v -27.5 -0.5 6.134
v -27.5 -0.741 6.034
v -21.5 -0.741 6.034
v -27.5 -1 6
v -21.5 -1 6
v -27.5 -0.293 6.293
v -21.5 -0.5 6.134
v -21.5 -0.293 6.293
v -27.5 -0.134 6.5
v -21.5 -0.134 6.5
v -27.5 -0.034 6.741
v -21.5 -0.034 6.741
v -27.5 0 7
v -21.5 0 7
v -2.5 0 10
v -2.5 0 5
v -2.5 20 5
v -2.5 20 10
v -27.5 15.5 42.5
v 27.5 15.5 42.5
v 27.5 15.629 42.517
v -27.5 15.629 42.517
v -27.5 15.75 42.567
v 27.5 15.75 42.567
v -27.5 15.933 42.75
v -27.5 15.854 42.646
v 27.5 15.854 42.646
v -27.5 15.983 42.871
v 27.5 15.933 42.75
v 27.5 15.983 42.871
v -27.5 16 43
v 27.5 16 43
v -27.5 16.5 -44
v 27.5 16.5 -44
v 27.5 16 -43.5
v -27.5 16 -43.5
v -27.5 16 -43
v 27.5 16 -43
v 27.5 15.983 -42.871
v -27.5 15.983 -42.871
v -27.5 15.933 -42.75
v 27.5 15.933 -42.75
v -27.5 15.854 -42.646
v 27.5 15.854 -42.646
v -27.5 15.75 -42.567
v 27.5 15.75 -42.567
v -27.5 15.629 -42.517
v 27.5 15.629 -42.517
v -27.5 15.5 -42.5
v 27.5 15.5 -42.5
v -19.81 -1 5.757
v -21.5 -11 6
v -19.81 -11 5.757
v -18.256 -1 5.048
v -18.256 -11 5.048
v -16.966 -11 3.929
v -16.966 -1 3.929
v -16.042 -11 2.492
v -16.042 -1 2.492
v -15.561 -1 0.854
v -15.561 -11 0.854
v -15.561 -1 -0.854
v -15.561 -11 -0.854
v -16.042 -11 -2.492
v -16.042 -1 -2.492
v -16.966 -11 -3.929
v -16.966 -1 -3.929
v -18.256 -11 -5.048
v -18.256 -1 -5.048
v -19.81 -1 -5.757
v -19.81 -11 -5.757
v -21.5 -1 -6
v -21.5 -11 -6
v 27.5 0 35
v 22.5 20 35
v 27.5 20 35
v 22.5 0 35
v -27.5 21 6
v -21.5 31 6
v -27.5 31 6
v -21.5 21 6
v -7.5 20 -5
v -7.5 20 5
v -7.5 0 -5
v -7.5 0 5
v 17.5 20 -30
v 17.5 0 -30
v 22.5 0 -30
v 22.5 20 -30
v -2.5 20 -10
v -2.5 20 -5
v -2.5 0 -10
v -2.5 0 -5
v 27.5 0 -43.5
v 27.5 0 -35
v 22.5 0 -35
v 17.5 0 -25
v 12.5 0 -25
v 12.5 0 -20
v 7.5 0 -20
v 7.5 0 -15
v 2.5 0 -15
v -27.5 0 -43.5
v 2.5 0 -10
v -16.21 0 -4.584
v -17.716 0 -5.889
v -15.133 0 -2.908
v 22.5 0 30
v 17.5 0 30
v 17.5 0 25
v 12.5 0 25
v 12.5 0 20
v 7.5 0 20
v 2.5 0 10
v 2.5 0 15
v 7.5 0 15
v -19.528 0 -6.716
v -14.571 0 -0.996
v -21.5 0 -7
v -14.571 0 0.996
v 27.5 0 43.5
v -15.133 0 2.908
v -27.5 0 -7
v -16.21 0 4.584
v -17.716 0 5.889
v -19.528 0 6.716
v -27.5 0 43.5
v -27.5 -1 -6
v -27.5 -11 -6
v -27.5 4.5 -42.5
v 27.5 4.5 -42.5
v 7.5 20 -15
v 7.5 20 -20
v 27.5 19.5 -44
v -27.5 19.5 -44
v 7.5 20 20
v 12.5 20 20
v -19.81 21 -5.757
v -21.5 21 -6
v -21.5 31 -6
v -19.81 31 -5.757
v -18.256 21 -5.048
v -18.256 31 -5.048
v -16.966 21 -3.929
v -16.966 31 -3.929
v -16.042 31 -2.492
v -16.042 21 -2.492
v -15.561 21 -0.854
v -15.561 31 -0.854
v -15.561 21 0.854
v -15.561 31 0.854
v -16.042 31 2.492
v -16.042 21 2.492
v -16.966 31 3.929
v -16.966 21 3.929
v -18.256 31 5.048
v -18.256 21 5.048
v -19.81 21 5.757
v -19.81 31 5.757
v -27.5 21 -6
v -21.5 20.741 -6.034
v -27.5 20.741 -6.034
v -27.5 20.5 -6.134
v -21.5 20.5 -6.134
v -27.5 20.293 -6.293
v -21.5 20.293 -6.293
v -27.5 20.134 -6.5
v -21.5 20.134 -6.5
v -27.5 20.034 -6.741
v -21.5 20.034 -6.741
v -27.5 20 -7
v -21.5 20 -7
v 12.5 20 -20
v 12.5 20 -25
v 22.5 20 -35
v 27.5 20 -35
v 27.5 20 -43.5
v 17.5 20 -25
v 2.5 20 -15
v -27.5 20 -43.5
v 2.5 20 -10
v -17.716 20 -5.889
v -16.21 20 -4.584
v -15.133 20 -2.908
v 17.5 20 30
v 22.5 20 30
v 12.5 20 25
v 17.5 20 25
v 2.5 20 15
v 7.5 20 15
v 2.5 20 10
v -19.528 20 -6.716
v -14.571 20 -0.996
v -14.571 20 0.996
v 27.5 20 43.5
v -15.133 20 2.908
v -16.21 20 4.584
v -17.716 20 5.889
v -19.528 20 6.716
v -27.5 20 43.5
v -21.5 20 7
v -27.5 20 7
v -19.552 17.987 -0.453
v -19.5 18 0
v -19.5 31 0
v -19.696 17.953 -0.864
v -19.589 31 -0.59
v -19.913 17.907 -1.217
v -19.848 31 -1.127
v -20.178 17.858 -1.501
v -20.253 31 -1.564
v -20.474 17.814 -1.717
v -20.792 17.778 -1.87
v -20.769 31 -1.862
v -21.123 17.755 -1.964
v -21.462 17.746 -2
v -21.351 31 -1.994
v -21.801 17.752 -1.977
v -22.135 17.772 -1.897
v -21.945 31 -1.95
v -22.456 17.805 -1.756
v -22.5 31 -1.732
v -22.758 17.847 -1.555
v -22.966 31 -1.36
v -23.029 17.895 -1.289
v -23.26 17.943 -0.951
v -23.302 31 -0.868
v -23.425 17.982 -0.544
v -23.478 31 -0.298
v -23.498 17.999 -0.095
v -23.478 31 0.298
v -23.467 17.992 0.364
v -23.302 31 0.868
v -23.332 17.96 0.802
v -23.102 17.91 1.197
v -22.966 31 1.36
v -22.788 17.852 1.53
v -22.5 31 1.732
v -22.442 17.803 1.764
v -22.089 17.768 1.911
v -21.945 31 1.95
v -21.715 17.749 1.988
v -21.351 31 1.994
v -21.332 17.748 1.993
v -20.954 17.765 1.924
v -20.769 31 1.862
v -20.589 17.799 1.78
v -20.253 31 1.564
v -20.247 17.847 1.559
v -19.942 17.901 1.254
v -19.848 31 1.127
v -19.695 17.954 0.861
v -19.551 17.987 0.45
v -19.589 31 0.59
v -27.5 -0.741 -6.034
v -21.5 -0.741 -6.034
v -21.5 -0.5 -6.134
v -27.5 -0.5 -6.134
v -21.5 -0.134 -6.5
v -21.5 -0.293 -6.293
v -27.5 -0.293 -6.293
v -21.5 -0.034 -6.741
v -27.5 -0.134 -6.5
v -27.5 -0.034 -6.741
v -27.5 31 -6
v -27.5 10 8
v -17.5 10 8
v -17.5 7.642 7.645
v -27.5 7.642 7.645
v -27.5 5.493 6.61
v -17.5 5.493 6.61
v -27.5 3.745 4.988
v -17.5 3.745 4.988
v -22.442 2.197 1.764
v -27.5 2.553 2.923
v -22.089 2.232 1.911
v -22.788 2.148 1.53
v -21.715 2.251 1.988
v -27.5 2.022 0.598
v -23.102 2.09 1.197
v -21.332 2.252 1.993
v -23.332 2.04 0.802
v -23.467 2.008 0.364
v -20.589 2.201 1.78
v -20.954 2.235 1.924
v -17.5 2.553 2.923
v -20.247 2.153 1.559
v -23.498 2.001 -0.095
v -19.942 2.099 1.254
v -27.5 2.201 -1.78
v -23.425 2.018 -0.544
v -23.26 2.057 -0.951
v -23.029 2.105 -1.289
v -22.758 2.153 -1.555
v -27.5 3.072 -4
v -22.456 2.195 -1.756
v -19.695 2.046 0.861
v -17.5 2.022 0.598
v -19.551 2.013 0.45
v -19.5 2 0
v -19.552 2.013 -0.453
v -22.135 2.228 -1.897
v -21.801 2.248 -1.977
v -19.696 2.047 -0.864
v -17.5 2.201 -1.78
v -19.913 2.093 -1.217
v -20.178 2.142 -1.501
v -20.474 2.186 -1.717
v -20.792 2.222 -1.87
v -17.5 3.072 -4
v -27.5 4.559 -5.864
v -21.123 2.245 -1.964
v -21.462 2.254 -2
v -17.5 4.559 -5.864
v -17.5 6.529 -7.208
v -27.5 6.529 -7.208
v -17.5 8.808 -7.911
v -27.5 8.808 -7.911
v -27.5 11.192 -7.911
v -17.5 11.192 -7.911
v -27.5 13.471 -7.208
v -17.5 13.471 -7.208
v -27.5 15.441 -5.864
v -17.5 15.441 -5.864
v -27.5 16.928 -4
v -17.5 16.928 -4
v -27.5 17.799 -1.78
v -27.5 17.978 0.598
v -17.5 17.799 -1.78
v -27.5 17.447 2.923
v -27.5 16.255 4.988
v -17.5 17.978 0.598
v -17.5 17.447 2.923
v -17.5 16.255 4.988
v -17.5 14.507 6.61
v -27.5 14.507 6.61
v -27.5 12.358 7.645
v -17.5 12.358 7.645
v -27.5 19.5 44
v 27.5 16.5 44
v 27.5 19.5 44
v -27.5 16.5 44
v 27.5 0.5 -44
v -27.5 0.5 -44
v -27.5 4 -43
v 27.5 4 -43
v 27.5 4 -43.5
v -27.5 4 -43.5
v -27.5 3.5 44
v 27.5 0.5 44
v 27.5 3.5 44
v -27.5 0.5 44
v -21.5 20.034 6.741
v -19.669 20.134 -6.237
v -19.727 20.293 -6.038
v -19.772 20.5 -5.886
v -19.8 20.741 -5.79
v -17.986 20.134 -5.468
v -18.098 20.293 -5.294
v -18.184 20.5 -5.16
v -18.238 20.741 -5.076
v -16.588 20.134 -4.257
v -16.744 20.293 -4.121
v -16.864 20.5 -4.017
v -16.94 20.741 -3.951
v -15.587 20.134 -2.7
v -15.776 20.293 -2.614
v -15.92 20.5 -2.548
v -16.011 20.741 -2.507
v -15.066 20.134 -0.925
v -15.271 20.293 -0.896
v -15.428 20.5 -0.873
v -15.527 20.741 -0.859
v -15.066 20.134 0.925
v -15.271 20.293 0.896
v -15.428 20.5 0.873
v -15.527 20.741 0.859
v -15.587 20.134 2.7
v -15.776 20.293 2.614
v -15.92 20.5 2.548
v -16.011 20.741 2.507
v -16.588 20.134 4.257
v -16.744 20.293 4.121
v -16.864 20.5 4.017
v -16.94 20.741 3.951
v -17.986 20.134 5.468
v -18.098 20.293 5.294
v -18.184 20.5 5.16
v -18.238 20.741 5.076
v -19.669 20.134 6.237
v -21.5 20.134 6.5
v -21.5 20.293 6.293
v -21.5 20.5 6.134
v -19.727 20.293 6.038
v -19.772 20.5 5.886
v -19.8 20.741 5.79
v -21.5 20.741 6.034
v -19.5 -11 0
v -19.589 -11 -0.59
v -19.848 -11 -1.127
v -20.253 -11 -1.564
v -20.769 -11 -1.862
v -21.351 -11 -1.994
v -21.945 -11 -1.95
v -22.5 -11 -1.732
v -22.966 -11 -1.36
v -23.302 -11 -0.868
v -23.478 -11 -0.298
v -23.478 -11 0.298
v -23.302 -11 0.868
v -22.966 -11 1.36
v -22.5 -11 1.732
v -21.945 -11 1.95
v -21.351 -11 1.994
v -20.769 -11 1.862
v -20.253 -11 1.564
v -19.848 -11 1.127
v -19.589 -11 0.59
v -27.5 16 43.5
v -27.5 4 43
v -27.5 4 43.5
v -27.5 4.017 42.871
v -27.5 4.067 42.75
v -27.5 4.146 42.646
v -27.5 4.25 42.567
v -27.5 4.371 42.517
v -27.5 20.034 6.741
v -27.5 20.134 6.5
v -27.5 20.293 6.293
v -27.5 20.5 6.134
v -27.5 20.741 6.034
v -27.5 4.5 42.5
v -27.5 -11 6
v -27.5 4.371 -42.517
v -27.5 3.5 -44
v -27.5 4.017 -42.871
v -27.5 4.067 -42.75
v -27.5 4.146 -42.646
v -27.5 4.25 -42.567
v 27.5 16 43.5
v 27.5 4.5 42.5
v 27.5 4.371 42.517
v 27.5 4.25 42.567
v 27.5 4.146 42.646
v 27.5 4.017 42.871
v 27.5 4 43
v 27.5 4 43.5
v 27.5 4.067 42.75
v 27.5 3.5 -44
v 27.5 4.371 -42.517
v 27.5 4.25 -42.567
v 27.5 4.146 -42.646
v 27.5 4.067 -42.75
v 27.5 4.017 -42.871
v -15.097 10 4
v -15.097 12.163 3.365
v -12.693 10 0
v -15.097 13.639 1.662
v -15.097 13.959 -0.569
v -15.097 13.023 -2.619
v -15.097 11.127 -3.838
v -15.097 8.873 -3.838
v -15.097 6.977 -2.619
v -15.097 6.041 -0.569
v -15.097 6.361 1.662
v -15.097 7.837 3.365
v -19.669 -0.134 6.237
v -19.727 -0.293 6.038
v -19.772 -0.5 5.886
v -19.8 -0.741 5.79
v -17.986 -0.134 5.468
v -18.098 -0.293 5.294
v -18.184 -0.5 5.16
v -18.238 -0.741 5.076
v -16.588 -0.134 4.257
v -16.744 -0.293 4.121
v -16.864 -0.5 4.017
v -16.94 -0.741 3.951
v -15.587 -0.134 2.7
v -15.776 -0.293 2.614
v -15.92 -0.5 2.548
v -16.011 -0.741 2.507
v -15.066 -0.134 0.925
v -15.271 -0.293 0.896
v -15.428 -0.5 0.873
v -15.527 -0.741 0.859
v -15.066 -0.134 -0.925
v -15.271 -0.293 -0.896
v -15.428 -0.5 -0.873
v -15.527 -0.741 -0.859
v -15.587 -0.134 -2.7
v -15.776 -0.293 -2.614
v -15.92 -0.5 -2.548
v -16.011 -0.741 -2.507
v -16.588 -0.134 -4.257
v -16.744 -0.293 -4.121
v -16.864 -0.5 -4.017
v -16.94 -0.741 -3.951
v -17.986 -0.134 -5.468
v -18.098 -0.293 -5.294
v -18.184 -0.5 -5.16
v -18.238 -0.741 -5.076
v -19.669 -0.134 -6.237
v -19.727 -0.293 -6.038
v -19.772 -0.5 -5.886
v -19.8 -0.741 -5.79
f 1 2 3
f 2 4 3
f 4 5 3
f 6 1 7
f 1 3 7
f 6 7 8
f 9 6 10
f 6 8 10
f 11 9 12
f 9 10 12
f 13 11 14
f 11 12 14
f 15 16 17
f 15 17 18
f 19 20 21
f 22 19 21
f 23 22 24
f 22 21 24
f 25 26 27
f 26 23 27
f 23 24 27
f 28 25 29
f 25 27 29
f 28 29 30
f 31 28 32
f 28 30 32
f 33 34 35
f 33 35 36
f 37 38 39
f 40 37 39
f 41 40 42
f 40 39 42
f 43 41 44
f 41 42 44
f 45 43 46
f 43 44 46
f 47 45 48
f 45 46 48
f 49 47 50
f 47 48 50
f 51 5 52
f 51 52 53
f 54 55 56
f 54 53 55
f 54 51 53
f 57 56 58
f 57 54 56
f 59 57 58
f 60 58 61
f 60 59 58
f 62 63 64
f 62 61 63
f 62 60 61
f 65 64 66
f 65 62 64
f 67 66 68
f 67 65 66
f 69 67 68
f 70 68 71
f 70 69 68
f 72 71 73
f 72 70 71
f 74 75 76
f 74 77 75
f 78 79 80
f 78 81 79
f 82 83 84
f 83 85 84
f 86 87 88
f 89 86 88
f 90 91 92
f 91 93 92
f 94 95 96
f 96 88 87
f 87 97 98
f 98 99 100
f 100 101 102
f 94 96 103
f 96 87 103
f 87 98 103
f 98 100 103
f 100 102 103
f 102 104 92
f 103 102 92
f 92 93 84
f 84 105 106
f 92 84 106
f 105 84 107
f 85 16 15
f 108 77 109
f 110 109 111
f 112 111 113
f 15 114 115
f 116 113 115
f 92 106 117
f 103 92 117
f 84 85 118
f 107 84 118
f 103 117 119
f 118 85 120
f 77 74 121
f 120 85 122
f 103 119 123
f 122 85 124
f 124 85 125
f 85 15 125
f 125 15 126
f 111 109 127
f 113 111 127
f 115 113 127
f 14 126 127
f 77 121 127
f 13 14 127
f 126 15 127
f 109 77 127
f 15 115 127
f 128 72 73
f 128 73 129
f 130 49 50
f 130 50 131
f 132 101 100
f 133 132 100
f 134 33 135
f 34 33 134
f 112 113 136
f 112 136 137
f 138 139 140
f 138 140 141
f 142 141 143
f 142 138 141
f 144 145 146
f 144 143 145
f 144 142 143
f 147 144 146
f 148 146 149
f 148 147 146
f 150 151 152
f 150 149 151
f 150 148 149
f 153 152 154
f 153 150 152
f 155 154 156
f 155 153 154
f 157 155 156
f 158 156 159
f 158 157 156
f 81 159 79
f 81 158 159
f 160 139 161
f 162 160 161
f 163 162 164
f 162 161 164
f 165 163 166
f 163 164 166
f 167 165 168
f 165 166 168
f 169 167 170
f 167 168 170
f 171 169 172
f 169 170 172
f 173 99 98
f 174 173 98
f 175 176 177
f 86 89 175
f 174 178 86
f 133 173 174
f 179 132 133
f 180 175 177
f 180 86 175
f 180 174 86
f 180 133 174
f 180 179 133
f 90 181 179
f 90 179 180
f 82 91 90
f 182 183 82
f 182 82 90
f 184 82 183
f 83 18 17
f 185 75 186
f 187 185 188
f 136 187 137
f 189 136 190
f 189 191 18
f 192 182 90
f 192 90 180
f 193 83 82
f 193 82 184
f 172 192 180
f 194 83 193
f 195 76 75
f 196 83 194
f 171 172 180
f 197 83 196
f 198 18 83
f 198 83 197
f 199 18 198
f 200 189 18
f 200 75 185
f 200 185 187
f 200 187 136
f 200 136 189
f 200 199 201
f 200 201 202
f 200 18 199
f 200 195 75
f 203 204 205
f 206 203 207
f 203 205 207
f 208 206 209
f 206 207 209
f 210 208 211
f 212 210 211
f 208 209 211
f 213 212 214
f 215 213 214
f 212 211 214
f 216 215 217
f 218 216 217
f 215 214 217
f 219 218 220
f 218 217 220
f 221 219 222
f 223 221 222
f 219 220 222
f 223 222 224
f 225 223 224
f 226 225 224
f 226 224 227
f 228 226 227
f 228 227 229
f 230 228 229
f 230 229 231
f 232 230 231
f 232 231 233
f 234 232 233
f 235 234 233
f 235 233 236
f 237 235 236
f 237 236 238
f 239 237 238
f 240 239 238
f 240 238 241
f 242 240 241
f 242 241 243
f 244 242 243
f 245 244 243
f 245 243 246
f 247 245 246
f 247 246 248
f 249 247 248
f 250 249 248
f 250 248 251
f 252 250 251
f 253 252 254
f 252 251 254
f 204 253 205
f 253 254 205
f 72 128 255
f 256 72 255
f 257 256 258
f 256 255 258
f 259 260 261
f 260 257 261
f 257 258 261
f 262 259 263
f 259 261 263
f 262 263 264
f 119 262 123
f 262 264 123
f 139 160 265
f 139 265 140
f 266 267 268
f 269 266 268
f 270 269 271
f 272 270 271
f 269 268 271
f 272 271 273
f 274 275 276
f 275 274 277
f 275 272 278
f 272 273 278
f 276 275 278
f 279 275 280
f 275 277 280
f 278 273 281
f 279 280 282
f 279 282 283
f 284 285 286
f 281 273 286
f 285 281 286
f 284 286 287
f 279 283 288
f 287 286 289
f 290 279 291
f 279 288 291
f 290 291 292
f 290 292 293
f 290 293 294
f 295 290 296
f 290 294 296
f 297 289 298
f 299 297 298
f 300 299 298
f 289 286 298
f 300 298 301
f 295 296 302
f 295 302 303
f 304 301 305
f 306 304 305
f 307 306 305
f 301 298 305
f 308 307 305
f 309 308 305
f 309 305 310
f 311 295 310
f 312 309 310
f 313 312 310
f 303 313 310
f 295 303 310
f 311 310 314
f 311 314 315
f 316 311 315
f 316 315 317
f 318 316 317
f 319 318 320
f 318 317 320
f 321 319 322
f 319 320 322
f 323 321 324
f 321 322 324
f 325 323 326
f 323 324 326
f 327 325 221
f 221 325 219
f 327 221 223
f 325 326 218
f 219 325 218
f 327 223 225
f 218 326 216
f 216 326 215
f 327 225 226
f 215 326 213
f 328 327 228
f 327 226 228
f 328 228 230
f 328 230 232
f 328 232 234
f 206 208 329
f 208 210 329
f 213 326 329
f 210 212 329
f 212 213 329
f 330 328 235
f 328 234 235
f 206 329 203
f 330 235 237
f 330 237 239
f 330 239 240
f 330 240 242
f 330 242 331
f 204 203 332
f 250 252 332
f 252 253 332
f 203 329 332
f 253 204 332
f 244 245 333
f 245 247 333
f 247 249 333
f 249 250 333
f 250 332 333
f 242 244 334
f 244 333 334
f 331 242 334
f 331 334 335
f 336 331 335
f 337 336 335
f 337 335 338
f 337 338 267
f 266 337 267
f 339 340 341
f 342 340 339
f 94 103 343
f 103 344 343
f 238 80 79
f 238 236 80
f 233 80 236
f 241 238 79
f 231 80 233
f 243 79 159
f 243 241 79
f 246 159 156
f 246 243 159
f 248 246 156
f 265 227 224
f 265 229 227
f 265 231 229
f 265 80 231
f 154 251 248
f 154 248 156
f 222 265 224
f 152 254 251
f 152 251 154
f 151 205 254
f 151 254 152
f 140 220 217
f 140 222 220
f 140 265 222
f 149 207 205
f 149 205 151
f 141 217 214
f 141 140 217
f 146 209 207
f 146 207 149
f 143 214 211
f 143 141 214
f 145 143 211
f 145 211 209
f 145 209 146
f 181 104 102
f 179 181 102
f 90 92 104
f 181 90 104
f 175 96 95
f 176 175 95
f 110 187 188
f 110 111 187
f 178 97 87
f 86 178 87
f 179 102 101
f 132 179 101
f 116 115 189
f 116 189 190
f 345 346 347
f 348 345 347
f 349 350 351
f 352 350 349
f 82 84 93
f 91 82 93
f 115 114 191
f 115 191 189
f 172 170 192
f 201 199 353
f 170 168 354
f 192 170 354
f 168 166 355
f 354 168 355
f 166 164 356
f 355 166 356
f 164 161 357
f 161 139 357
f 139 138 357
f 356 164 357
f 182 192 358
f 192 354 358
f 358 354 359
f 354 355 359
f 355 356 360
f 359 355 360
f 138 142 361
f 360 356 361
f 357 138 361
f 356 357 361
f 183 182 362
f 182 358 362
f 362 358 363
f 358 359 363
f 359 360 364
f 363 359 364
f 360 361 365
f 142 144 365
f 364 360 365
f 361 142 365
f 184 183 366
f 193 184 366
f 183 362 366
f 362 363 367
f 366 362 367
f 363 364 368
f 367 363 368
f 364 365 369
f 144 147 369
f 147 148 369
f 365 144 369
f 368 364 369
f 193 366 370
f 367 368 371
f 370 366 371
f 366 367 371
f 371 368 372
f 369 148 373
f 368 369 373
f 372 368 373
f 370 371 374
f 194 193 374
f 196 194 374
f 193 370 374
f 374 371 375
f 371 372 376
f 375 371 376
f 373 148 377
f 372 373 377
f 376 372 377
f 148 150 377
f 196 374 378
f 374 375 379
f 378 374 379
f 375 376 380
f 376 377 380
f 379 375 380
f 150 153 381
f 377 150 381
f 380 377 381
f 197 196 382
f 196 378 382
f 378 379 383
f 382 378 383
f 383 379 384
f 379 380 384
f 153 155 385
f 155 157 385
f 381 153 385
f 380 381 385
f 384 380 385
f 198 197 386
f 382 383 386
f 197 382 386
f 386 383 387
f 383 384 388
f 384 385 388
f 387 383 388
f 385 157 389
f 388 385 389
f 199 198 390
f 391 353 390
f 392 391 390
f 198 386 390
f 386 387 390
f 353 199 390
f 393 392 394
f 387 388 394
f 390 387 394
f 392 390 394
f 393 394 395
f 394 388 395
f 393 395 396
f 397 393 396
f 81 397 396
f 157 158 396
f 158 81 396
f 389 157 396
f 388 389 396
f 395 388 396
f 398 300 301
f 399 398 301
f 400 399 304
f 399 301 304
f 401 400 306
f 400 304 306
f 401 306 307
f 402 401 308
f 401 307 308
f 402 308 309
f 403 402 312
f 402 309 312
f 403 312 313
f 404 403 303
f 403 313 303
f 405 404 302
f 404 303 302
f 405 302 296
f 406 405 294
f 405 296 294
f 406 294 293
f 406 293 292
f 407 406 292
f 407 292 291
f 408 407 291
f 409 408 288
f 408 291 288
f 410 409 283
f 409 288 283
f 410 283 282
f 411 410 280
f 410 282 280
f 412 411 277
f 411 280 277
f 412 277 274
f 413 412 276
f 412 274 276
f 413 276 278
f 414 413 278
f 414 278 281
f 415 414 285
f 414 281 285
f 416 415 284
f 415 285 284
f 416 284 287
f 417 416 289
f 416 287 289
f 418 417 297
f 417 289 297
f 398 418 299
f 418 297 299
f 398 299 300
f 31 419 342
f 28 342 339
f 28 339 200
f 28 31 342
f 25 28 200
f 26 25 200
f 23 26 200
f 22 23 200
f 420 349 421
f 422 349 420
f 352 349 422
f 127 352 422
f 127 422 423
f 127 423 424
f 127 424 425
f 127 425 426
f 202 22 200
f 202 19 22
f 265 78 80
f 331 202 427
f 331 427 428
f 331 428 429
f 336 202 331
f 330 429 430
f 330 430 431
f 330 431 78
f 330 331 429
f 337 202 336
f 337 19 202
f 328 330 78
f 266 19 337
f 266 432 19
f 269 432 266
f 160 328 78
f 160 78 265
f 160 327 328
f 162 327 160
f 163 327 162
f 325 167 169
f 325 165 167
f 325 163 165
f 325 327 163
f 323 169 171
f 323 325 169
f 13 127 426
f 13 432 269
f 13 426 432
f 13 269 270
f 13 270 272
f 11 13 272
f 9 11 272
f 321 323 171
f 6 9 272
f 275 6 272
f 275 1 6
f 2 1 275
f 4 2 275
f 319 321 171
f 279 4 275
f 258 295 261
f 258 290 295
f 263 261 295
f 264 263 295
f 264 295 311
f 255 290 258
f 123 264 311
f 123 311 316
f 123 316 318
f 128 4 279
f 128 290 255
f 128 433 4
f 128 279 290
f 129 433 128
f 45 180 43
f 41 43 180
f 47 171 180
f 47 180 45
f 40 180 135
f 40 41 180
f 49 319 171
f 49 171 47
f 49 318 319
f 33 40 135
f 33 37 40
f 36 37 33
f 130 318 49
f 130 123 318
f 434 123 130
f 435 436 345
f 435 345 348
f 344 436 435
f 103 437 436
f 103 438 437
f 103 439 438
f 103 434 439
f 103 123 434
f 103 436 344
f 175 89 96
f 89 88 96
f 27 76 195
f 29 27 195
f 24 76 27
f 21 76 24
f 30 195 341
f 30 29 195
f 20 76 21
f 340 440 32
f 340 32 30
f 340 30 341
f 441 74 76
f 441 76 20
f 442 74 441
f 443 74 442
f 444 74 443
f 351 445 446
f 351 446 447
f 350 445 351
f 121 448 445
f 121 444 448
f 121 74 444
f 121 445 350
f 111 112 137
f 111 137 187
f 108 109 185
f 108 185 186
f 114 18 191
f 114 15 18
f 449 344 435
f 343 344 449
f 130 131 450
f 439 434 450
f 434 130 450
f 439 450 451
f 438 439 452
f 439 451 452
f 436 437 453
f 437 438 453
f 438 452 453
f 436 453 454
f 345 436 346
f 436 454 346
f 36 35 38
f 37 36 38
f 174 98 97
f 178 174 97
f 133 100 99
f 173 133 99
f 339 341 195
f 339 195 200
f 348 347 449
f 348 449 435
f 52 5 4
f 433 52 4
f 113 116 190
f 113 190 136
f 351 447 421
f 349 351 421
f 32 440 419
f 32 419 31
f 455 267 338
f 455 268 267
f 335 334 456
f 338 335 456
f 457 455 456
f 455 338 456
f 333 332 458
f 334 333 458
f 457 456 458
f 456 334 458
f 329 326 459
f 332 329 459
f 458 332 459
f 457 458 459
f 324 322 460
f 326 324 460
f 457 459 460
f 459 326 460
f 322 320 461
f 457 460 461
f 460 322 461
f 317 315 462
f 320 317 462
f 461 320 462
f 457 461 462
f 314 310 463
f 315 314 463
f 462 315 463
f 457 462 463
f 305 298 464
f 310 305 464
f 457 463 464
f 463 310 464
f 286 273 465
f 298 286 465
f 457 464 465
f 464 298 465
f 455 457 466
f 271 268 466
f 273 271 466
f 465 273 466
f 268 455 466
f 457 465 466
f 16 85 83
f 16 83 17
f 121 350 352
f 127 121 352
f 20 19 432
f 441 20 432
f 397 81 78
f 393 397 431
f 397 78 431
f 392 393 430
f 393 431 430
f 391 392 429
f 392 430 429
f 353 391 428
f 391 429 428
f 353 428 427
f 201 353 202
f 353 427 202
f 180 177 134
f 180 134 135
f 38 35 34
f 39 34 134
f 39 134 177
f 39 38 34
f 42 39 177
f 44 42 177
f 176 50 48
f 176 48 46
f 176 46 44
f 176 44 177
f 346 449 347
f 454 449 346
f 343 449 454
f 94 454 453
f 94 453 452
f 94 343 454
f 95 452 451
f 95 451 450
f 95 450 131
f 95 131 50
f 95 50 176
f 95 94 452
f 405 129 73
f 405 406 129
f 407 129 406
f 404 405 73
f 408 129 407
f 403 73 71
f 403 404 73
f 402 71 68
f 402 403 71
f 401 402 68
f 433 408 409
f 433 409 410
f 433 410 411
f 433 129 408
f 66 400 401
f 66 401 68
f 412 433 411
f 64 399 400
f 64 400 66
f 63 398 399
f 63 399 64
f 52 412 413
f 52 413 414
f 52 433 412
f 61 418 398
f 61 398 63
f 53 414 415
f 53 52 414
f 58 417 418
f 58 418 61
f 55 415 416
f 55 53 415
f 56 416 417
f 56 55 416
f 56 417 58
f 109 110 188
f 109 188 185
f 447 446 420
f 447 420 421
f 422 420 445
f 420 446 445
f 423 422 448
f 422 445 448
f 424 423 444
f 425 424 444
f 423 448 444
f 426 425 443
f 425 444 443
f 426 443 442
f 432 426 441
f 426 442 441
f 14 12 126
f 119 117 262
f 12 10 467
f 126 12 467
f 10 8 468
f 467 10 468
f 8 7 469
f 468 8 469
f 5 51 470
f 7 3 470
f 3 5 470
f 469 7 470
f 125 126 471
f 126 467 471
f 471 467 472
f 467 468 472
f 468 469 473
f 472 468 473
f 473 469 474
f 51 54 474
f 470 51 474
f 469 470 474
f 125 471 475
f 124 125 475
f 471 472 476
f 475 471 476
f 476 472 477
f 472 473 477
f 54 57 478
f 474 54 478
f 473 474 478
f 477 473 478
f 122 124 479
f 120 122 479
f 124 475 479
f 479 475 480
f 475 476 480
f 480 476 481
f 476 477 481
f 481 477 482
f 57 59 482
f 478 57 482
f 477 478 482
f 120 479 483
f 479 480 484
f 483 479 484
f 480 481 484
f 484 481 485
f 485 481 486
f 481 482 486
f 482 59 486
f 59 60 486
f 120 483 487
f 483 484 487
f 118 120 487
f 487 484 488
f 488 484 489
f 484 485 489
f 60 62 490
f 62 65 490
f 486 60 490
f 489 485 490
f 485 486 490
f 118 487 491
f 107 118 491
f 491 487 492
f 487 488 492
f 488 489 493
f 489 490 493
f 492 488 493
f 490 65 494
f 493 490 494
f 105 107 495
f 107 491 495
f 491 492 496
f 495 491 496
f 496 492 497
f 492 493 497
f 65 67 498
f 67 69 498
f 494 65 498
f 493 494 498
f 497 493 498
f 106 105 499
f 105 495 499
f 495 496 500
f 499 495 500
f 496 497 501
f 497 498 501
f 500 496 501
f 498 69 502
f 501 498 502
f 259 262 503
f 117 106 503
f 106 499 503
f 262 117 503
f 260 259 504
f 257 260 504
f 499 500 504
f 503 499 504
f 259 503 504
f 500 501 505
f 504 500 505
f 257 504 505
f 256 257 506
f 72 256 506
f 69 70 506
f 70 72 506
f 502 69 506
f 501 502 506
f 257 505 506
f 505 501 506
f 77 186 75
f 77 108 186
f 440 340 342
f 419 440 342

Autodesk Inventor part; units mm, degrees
ref_plane "YZ Plane" through (0, 0, 0) normal (1, 0, 0) x (0, 1, 0)
ref_plane "XZ Plane" through (0, 0, 0) normal (0, 1, 0) x (-1, 0, 0)
ref_plane "XY Plane" through (0, 0, 0) normal (0, 0, 1) x (1, 0, 0)
sketch "Sketch1" plane through (0, 0, 0) normal (0, 1, 0) x (-1, 0, 0)
  line L0 (-27.5, 44) -> (27.5, 44)
  line L1 (27.5, 44) -> (27.5, -44)
  line L2 (27.5, -44) -> (-27.5, -44)
  line L3 (-27.5, -44) -> (-27.5, 44)
  line L4 (-27.5, 44) -> (27.5, -44) construction
  line L5 (27.5, 44) -> (-27.5, -44) construction
  line L6 (-27.5, 44) -> (-22.5, 44)
  line L7 (-22.5, 44) -> (-22.5, 35)
  line L8 (-22.5, 35) -> (-27.5, 35)
  line L9 (-27.5, 35) -> (-27.5, 44)
  line L10 (-22.5, 35) -> (-17.5, 35)
  line L11 (-17.5, 35) -> (-17.5, 30)
  line L12 (-17.5, 30) -> (-22.5, 30)
  line L13 (-22.5, 30) -> (-22.5, 35)
  line L14 (-17.5, 30) -> (-12.5, 30)
  line L15 (-12.5, 30) -> (-12.5, 25)
  line L16 (-12.5, 25) -> (-17.5, 25)
  line L17 (-17.5, 25) -> (-17.5, 30)
  line L18 (-12.5, 25) -> (-7.5, 25)
  line L19 (-7.5, 25) -> (-7.5, 20)
  line L20 (-7.5, 20) -> (-12.5, 20)
  line L21 (-12.5, 20) -> (-12.5, 25)
  line L22 (-7.5, 20) -> (-2.5, 20)
  line L23 (-2.5, 20) -> (-2.5, 15)
  line L24 (-2.5, 15) -> (-7.5, 15)
  line L25 (-7.5, 15) -> (-7.5, 20)
  line L26 (-2.5, 15) -> (2.5, 15)
  line L27 (2.5, 15) -> (2.5, 10)
  line L28 (2.5, 10) -> (-2.5, 10)
  line L29 (-2.5, 10) -> (-2.5, 15)
  line L30 (2.5, 10) -> (7.5, 10)
  line L31 (7.5, 10) -> (7.5, 5)
  line L32 (7.5, 5) -> (2.5, 5)
  line L33 (2.5, 5) -> (2.5, 10)
  line L34 (13, 5) -> (13, 0)
  line L35 (13, 0) -> (8, 0)
  line L36 (8, 0) -> (8, 5)
  line L37 (-27.5, -44) -> (27.5, 44) construction
  line L38 (-22.5, -35) -> (-27.5, -35)
  line L39 (-17.5, -30) -> (-22.5, -30)
  line L40 (-22.5, -30) -> (-22.5, -35)
  line L41 (-17.5, -25) -> (-17.5, -30)
  line L42 (-7.5, -20) -> (-12.5, -20)
  line L43 (-12.5, -20) -> (-12.5, -25)
  line L44 (-2.5, -15) -> (-7.5, -15)
  line L45 (-7.5, -15) -> (-7.5, -20)
  line L46 (2.5, -10) -> (-2.5, -10)
  line L47 (-2.5, -10) -> (-2.5, -15)
  line L48 (7.5, -5) -> (2.5, -5)
  line L49 (2.5, -5) -> (2.5, -10)
  line L50 (8, 0) -> (8, -5)
  line L51 (7.5, 5) -> (7.5, -5)
  line L52 (27.5, 0) -> (21.5, 0)
  circle A0 centre (21.5, 0) radius 6
  line L53 (-12.5, -25) -> (-17.5, -25)
  point P0 (0, 0)
  dimension "d0" = 55
  dimension "d1" = 88
  dimension "d2" = 5
  dimension "d3" = 9
  dimension "d4" = 5
  dimension "d5" = 5
  dimension "d6" = 5
  dimension "d7" = 5
  dimension "d8" = 5
  dimension "d9" = 5
  dimension "d10" = 5
  dimension "d11" = 5
  dimension "d12" = 5
  dimension "d13" = 5
  dimension "d14" = 5
  dimension "d15" = 5
  dimension "d16" = 5
  dimension "d17" = 5
  dimension "d18" = 6
extrude "Extrusion1" add sketch "Sketch1" along normal blind 20 contours L0 L7 L8 L3 | A0 | L0 L1 L2 L3 L38 L40 L39 L41 L53 L43 L42 L45 L44 L47 L46 L49 L48 L51 L31 L30 L27 L26 L23 L22 L19 L18 L15 L14 L11 L10 L7 | L10 L11 L12 L13 | L14 L15 L16 L17 | L18 L19 L20 L21 | L22 L23 L24 L25 | L26 L27 L28 L29 | L30 L31 L32 L33
sketch "Sketch2" plane through (0, 0, 0) normal (0, -1, 0) x (1, 0, 0)
  line L0 (-27.5, -44) -> (-27.5, 44) projected
  line L1 (-27.5, 0) -> (-21.5, 0)
  circle A0 centre (-21.5, 0) radius 6
  line L2 (-21.5, -6) -> (-27.5, -6)
  line L3 (-21.5, 6) -> (-27.5, 6)
  point P0 (0, 0)
  dimension "d21" = 6
extrude "Extrusion2" add sketch "Sketch2" along normal blind 11
sketch "Sketch3" plane through (0, 20, 0) normal (0, 1, 0) x (1, 0, 0)
  line L0 (-21.5, -6) -> (-27.5, -6) projected
  line L1 (-27.5, -6) -> (-27.5, 6) projected
  line L2 (-27.5, 6) -> (-21.5, 6) projected
  arc A0 (-21.5, -6) -> (-21.5, 6) centre (-21.5, 0) ccw projected
  point P0 (0, 0)
extrude "Extrusion3" add sketch "Sketch3" along normal blind 11
sketch "Sketch4" plane through (0, 31, 0) normal (0, 1, 0) x (1, 0, 0)
  arc A0 (-21.5, -6) -> (-21.5, 6) centre (-21.5, 0) ccw projected
  circle A1 centre (-21.5, 0) radius 2
  point P0 (0, 0)
  dimension "d26" = 4
extrude "Extrusion4" cut sketch "Sketch4" against normal through all
sketch "Sketch5" plane through (-27.5, 0, 44) normal (-1, 0, 0) x (0, 0, 1)
  line L0 (-44, 0) -> (-44, 10)
  line L1 (-46, 31) -> (-46, -11) projected
hole "Hole1" at (-27.5, 10, 0) direction (1, 0, 0) diameter 16 depth 10 tip angle 118
sketch "Sketch6" plane through (-27.5, 0, 44) normal (-1, 0, 0) x (0, 0, 1)
  line L0 (1.5, 16) -> (-1.5, 16)
  line L1 (-1.5, 16) -> (-1.5, 4)
  line L2 (-1.5, 4) -> (1.5, 4)
  line L3 (1.5, 4) -> (1.5, 16)
  line L4 (0, 0) -> (0, 20) projected
  line L5 (1.5, 16) -> (-1.5, 4) construction
  line L6 (-1.5, 16) -> (1.5, 4) construction
  line L7 (-89.5, 16) -> (-86.5, 16)
  line L8 (-86.5, 16) -> (-86.5, 4)
  line L9 (-86.5, 4) -> (-89.5, 4)
  line L10 (-89.5, 4) -> (-89.5, 16)
  line L11 (-88, 0) -> (-88, 20) projected
  line L12 (-89.5, 16) -> (-86.5, 4) construction
  line L13 (-86.5, 16) -> (-89.5, 4) construction
  point P0 (-44, 0)
  point P1 (0, 10)
  point P2 (-88, 10)
  dimension "d36" = 3
  dimension "d37" = 12
  dimension "d38" = 3
  dimension "d39" = 12
extrude "Extrusion5" cut sketch "Sketch6" against normal through all
fillet "Fillet1" radius 0.5 4 edges at (0, 4, 42.5) (0, 16, 42.5) (0, 4, -42.5) (0, 16, -42.5)
fillet "Fillet2" radius 1 6 edges at (-24.5, 20, -6) (-15.5, 20, 0) (-24.5, 20, 6) (-15.5, 0, 0) (-24.5, 0, 6) (-24.5, 0, -6)
chamfer "Chamfer1" distance 0.5 angle 45 8 edges at (0, 20, -44) (0, 16, -44) (0, 4, -44) (0, 0, -44) (0, 20, 44) (0, 16, 44) (0, 0, 44) (0, 4, 44)
thread "Thread1" size "M4x0.7" class "6H" standard "ANSI Metric M Profile" full length
thread "Thread2" size "M4x0.7" class "6H" standard "ANSI Metric M Profile" full length
properties part number "pfa"
